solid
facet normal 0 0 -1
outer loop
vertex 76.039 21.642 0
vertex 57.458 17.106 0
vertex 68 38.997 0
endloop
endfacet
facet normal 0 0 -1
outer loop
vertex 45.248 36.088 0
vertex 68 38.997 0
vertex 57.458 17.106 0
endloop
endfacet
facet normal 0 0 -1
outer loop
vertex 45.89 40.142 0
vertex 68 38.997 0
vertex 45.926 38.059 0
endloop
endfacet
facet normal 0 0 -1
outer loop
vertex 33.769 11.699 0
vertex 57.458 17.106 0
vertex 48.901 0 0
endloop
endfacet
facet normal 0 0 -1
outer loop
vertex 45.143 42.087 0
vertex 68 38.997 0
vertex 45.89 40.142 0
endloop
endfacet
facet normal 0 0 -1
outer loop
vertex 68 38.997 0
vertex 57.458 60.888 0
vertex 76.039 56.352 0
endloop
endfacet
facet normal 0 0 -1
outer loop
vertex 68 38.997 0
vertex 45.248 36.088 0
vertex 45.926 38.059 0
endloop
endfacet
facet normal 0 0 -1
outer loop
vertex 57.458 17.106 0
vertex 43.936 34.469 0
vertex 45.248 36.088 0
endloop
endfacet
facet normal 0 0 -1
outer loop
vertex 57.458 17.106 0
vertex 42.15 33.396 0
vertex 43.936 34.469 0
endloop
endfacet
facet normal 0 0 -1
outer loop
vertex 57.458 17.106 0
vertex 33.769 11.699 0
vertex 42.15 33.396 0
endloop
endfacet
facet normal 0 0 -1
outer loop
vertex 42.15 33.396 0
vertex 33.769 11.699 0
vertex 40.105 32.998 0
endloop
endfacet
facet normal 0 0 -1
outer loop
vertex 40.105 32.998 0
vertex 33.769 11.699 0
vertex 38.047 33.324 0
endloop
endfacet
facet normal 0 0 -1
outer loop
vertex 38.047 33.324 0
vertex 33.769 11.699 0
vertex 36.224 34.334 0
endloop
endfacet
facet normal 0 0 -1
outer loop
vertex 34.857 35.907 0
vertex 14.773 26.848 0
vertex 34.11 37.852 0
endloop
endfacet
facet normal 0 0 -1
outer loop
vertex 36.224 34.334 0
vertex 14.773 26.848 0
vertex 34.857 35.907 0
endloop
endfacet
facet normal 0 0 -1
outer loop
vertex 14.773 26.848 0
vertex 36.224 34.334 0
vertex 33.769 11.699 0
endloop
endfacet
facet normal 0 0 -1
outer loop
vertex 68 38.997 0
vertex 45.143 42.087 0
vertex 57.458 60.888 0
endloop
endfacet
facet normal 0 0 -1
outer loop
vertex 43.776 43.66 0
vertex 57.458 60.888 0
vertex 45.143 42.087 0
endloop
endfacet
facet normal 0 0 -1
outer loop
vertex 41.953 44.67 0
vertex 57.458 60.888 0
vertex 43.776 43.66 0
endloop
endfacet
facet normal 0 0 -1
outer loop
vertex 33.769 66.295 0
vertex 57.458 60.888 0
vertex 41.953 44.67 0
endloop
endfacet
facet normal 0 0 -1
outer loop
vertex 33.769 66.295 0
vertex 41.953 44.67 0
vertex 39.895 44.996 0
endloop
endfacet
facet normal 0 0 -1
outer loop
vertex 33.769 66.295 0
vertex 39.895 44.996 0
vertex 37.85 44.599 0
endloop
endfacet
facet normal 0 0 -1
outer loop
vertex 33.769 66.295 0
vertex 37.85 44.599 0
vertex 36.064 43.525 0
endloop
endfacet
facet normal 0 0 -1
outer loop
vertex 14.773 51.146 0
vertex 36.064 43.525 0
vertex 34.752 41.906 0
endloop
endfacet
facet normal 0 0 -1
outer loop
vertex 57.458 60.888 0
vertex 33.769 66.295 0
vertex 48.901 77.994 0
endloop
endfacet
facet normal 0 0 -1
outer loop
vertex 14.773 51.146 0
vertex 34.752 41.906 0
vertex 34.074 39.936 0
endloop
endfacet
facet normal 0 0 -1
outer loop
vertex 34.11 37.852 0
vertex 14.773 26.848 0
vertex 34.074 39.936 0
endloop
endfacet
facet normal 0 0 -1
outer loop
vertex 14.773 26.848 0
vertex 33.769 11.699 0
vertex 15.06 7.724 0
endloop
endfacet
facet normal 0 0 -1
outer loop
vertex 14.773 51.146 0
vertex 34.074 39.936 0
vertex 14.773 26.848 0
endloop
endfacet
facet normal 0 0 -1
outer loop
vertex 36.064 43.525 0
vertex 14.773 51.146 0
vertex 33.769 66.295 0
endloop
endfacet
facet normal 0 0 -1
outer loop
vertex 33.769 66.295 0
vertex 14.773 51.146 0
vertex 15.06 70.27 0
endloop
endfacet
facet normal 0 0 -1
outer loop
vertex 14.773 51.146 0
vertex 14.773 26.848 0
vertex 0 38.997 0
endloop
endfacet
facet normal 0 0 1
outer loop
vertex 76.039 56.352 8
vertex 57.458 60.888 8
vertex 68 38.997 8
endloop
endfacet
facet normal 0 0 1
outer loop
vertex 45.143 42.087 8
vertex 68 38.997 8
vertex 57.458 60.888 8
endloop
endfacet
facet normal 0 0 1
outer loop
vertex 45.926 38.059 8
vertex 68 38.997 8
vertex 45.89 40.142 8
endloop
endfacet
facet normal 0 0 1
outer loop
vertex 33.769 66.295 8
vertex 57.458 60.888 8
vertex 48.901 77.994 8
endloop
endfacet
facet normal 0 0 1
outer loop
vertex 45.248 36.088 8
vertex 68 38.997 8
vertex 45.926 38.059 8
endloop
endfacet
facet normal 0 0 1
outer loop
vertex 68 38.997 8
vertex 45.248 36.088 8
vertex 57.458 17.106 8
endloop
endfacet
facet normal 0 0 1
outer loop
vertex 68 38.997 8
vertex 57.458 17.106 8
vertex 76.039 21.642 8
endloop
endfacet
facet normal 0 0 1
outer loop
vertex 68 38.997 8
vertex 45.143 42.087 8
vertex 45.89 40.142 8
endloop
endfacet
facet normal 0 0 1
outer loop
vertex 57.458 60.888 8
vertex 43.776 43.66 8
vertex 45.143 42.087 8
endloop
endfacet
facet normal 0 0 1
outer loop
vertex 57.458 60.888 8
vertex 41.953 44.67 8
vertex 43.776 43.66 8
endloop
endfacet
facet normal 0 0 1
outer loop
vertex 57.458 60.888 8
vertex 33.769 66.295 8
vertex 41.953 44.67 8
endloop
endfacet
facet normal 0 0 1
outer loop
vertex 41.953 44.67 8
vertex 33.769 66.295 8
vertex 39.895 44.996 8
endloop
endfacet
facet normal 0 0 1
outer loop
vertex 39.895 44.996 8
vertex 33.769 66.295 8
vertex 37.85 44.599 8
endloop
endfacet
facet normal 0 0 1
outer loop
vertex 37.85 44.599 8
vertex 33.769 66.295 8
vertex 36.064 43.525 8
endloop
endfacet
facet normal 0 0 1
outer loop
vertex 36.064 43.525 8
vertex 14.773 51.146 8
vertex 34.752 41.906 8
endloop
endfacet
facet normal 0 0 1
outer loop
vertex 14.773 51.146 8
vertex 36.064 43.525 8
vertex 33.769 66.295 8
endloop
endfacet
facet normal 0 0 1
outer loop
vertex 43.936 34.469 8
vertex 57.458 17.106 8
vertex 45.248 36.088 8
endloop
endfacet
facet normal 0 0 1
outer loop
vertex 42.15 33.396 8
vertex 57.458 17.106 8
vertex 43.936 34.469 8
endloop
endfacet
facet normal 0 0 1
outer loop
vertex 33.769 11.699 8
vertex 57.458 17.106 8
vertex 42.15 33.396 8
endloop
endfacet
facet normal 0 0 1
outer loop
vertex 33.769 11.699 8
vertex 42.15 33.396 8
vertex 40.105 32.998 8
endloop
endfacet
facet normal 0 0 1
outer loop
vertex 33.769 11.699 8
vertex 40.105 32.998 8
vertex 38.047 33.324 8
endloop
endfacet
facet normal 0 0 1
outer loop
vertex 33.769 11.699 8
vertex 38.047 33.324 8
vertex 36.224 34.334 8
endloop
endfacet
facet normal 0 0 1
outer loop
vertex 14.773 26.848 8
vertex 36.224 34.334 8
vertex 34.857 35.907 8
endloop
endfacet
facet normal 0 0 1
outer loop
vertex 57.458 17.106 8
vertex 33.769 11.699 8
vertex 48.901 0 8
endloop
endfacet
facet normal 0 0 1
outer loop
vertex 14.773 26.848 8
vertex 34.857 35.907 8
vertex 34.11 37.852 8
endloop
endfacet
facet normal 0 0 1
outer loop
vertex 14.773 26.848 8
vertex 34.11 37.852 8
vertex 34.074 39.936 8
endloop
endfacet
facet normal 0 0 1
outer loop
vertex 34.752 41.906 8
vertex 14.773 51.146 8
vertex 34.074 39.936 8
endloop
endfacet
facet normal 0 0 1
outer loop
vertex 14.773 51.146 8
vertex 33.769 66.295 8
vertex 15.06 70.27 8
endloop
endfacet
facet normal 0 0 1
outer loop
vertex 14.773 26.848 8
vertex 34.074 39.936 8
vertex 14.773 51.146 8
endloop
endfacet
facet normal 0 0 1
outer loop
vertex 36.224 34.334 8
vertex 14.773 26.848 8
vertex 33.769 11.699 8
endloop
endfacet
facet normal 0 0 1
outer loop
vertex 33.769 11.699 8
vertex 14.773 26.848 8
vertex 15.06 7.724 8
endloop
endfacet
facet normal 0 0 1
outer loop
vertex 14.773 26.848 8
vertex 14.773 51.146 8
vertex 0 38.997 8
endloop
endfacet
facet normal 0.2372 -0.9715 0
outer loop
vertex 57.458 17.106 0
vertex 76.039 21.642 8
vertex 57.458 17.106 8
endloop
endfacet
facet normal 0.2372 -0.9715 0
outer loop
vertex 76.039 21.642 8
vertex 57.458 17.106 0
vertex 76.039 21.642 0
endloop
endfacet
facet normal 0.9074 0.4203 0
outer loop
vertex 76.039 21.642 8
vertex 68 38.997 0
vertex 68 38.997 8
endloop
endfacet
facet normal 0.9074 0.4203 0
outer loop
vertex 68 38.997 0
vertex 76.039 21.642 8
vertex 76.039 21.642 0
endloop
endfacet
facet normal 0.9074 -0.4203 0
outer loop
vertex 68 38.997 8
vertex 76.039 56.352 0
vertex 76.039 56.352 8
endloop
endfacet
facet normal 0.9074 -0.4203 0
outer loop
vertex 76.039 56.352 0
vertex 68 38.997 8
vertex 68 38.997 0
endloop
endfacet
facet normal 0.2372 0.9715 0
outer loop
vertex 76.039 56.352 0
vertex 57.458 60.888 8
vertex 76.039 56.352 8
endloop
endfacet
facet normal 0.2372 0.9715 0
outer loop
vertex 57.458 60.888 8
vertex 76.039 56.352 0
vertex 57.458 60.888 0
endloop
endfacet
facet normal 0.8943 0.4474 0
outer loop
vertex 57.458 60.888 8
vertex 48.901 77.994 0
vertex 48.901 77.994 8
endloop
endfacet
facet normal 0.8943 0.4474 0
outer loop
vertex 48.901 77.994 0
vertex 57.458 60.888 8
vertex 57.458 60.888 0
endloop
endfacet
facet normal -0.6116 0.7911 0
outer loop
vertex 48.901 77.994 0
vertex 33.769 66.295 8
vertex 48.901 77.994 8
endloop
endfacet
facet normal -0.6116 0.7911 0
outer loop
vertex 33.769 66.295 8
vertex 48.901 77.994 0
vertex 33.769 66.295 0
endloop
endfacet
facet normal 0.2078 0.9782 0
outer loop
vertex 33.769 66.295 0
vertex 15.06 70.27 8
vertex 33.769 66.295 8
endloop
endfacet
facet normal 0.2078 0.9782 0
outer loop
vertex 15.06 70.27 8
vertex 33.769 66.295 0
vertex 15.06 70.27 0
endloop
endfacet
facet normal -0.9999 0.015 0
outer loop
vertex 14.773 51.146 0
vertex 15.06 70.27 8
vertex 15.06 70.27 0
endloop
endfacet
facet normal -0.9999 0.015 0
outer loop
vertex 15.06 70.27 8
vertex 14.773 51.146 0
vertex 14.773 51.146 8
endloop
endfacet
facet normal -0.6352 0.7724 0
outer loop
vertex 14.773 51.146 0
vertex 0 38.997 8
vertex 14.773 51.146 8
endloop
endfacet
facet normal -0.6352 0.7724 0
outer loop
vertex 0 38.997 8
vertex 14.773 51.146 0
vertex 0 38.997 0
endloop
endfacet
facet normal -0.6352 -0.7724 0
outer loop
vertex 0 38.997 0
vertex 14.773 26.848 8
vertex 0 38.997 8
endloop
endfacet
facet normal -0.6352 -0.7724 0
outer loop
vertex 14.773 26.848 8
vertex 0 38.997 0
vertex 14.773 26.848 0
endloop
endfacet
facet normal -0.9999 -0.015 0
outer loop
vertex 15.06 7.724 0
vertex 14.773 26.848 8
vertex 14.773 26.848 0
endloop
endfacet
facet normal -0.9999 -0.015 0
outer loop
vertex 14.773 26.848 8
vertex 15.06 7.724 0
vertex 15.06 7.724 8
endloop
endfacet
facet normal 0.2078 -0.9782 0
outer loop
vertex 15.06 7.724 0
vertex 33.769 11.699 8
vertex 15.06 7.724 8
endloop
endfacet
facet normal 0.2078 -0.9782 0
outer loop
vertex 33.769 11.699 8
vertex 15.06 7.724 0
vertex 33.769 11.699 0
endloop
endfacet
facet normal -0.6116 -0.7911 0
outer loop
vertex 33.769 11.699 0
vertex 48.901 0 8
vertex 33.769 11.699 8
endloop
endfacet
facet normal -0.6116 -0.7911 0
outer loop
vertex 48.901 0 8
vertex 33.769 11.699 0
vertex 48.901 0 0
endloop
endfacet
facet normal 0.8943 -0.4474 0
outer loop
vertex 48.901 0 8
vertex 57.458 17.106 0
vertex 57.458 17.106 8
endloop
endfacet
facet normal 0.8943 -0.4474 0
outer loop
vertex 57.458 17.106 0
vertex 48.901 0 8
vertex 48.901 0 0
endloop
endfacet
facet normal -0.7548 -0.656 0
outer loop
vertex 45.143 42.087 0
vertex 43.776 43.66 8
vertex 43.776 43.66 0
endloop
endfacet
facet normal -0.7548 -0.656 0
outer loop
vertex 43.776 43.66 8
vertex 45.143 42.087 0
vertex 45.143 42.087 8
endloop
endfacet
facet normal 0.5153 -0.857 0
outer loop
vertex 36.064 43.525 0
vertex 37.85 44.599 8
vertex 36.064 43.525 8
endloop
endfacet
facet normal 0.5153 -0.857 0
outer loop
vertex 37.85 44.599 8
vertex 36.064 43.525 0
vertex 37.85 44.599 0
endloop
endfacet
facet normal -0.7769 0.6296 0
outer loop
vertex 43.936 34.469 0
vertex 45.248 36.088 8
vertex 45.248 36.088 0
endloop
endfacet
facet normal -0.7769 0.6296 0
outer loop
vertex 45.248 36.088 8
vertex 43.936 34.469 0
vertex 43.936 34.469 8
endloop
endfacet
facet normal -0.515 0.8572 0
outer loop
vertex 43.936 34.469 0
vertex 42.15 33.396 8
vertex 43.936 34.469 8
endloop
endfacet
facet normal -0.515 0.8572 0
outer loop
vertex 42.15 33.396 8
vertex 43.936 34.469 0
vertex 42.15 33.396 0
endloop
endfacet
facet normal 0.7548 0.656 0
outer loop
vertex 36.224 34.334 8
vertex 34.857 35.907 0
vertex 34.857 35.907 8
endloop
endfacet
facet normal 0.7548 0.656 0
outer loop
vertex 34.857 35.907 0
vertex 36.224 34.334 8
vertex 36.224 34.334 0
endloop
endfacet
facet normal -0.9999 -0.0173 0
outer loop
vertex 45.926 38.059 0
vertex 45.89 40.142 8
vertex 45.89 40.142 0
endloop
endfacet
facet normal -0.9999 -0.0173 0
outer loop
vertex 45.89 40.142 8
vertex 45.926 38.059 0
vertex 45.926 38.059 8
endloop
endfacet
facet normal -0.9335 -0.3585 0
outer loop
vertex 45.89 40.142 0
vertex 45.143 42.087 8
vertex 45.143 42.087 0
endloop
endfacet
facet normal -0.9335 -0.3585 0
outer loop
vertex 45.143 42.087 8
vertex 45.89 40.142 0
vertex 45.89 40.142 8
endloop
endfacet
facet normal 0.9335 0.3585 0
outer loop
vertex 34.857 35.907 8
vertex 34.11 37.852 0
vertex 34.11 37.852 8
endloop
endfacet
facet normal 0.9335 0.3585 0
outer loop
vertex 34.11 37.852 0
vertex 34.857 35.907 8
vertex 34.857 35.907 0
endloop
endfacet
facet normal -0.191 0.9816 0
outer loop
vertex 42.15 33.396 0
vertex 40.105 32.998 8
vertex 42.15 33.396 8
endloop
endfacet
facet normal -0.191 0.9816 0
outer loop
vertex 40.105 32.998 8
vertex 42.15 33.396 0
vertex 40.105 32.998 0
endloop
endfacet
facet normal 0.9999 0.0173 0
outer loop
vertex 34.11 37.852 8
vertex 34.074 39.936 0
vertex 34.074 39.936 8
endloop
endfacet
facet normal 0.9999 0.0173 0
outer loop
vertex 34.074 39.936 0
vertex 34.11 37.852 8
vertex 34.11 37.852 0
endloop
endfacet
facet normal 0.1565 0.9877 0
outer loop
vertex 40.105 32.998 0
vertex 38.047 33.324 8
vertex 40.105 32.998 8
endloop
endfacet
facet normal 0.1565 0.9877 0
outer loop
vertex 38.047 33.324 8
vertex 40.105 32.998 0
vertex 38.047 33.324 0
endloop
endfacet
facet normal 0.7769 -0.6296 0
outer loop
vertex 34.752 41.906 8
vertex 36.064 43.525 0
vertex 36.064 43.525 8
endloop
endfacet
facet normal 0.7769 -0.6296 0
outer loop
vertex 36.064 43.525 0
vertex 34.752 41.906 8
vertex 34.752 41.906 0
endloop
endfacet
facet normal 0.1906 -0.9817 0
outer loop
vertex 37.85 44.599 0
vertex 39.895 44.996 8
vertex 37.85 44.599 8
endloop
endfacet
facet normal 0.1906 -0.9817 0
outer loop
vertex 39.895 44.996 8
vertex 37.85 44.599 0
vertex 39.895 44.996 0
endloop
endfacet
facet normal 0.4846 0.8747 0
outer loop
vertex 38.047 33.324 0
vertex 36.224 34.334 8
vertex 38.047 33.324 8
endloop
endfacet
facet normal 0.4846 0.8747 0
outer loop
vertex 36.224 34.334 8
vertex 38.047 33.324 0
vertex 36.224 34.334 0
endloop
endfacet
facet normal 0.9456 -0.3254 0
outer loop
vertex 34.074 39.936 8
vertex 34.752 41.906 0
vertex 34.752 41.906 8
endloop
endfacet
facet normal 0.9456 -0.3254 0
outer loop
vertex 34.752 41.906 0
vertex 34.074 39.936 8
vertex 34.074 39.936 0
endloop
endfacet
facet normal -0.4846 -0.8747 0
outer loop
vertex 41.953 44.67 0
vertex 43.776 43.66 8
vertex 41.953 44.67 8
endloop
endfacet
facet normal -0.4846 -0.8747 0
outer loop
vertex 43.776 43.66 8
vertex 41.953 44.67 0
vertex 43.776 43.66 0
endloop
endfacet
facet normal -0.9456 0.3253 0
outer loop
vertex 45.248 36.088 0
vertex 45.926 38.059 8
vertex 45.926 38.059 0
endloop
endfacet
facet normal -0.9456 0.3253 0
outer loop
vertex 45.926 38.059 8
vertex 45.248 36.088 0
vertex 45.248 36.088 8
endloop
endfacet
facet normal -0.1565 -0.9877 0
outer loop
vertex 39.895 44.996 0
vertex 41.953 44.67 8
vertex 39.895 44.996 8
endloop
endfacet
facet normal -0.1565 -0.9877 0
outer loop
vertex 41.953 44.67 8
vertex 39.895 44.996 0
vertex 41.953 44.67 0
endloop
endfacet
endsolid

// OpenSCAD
$fn = 32;

// ----------------------------------------------------------------------
// Star wheel: 7-point blunt, R40
// ----------------------------------------------------------------------

// --- parameters (mm) ---
n_points = 7;             // number of points / teeth
r_out = 40;               // tip radius
r_in = 28;                // root radius
bore_r = 6;               // centre bore radius
plate_t = 8;              // plate thickness, Z (extrusion height)
bore_d = 12;              // centre bore diameter
fit_tol = 0.05;           // declared fit tolerance (prompt contract)
free_tol = 0.2;           // declared free tolerance (prompt contract)

profile = [[0, 38.997], [14.773, 26.848], [15.06, 7.724], [33.769, 11.699], [48.901, 0], [57.458, 17.106], [76.039, 21.642], [68, 38.997], [76.039, 56.352], [57.458, 60.888], [48.901, 77.994], [33.769, 66.295], [15.06, 70.27], [14.773, 51.146]];  // primary outline, 14 points, counter clockwise
void_1 = [[45.89, 40.142], [45.143, 42.087], [43.776, 43.66], [41.953, 44.67], [39.895, 44.996], [37.85, 44.599], [36.064, 43.525], [34.752, 41.906], [34.074, 39.936], [34.11, 37.852], [34.857, 35.907], [36.224, 34.334], [38.047, 33.324], [40.105, 32.998], [42.15, 33.396], [43.936, 34.469], [45.248, 36.088], [45.926, 38.059]];  // centre bore, 18 points

// --- the one profile operation ---
difference() {
  linear_extrude(height = plate_t) polygon(points = profile);
  translate([0, 0, -1])
    linear_extrude(height = plate_t + 2) polygon(points = void_1);
}
